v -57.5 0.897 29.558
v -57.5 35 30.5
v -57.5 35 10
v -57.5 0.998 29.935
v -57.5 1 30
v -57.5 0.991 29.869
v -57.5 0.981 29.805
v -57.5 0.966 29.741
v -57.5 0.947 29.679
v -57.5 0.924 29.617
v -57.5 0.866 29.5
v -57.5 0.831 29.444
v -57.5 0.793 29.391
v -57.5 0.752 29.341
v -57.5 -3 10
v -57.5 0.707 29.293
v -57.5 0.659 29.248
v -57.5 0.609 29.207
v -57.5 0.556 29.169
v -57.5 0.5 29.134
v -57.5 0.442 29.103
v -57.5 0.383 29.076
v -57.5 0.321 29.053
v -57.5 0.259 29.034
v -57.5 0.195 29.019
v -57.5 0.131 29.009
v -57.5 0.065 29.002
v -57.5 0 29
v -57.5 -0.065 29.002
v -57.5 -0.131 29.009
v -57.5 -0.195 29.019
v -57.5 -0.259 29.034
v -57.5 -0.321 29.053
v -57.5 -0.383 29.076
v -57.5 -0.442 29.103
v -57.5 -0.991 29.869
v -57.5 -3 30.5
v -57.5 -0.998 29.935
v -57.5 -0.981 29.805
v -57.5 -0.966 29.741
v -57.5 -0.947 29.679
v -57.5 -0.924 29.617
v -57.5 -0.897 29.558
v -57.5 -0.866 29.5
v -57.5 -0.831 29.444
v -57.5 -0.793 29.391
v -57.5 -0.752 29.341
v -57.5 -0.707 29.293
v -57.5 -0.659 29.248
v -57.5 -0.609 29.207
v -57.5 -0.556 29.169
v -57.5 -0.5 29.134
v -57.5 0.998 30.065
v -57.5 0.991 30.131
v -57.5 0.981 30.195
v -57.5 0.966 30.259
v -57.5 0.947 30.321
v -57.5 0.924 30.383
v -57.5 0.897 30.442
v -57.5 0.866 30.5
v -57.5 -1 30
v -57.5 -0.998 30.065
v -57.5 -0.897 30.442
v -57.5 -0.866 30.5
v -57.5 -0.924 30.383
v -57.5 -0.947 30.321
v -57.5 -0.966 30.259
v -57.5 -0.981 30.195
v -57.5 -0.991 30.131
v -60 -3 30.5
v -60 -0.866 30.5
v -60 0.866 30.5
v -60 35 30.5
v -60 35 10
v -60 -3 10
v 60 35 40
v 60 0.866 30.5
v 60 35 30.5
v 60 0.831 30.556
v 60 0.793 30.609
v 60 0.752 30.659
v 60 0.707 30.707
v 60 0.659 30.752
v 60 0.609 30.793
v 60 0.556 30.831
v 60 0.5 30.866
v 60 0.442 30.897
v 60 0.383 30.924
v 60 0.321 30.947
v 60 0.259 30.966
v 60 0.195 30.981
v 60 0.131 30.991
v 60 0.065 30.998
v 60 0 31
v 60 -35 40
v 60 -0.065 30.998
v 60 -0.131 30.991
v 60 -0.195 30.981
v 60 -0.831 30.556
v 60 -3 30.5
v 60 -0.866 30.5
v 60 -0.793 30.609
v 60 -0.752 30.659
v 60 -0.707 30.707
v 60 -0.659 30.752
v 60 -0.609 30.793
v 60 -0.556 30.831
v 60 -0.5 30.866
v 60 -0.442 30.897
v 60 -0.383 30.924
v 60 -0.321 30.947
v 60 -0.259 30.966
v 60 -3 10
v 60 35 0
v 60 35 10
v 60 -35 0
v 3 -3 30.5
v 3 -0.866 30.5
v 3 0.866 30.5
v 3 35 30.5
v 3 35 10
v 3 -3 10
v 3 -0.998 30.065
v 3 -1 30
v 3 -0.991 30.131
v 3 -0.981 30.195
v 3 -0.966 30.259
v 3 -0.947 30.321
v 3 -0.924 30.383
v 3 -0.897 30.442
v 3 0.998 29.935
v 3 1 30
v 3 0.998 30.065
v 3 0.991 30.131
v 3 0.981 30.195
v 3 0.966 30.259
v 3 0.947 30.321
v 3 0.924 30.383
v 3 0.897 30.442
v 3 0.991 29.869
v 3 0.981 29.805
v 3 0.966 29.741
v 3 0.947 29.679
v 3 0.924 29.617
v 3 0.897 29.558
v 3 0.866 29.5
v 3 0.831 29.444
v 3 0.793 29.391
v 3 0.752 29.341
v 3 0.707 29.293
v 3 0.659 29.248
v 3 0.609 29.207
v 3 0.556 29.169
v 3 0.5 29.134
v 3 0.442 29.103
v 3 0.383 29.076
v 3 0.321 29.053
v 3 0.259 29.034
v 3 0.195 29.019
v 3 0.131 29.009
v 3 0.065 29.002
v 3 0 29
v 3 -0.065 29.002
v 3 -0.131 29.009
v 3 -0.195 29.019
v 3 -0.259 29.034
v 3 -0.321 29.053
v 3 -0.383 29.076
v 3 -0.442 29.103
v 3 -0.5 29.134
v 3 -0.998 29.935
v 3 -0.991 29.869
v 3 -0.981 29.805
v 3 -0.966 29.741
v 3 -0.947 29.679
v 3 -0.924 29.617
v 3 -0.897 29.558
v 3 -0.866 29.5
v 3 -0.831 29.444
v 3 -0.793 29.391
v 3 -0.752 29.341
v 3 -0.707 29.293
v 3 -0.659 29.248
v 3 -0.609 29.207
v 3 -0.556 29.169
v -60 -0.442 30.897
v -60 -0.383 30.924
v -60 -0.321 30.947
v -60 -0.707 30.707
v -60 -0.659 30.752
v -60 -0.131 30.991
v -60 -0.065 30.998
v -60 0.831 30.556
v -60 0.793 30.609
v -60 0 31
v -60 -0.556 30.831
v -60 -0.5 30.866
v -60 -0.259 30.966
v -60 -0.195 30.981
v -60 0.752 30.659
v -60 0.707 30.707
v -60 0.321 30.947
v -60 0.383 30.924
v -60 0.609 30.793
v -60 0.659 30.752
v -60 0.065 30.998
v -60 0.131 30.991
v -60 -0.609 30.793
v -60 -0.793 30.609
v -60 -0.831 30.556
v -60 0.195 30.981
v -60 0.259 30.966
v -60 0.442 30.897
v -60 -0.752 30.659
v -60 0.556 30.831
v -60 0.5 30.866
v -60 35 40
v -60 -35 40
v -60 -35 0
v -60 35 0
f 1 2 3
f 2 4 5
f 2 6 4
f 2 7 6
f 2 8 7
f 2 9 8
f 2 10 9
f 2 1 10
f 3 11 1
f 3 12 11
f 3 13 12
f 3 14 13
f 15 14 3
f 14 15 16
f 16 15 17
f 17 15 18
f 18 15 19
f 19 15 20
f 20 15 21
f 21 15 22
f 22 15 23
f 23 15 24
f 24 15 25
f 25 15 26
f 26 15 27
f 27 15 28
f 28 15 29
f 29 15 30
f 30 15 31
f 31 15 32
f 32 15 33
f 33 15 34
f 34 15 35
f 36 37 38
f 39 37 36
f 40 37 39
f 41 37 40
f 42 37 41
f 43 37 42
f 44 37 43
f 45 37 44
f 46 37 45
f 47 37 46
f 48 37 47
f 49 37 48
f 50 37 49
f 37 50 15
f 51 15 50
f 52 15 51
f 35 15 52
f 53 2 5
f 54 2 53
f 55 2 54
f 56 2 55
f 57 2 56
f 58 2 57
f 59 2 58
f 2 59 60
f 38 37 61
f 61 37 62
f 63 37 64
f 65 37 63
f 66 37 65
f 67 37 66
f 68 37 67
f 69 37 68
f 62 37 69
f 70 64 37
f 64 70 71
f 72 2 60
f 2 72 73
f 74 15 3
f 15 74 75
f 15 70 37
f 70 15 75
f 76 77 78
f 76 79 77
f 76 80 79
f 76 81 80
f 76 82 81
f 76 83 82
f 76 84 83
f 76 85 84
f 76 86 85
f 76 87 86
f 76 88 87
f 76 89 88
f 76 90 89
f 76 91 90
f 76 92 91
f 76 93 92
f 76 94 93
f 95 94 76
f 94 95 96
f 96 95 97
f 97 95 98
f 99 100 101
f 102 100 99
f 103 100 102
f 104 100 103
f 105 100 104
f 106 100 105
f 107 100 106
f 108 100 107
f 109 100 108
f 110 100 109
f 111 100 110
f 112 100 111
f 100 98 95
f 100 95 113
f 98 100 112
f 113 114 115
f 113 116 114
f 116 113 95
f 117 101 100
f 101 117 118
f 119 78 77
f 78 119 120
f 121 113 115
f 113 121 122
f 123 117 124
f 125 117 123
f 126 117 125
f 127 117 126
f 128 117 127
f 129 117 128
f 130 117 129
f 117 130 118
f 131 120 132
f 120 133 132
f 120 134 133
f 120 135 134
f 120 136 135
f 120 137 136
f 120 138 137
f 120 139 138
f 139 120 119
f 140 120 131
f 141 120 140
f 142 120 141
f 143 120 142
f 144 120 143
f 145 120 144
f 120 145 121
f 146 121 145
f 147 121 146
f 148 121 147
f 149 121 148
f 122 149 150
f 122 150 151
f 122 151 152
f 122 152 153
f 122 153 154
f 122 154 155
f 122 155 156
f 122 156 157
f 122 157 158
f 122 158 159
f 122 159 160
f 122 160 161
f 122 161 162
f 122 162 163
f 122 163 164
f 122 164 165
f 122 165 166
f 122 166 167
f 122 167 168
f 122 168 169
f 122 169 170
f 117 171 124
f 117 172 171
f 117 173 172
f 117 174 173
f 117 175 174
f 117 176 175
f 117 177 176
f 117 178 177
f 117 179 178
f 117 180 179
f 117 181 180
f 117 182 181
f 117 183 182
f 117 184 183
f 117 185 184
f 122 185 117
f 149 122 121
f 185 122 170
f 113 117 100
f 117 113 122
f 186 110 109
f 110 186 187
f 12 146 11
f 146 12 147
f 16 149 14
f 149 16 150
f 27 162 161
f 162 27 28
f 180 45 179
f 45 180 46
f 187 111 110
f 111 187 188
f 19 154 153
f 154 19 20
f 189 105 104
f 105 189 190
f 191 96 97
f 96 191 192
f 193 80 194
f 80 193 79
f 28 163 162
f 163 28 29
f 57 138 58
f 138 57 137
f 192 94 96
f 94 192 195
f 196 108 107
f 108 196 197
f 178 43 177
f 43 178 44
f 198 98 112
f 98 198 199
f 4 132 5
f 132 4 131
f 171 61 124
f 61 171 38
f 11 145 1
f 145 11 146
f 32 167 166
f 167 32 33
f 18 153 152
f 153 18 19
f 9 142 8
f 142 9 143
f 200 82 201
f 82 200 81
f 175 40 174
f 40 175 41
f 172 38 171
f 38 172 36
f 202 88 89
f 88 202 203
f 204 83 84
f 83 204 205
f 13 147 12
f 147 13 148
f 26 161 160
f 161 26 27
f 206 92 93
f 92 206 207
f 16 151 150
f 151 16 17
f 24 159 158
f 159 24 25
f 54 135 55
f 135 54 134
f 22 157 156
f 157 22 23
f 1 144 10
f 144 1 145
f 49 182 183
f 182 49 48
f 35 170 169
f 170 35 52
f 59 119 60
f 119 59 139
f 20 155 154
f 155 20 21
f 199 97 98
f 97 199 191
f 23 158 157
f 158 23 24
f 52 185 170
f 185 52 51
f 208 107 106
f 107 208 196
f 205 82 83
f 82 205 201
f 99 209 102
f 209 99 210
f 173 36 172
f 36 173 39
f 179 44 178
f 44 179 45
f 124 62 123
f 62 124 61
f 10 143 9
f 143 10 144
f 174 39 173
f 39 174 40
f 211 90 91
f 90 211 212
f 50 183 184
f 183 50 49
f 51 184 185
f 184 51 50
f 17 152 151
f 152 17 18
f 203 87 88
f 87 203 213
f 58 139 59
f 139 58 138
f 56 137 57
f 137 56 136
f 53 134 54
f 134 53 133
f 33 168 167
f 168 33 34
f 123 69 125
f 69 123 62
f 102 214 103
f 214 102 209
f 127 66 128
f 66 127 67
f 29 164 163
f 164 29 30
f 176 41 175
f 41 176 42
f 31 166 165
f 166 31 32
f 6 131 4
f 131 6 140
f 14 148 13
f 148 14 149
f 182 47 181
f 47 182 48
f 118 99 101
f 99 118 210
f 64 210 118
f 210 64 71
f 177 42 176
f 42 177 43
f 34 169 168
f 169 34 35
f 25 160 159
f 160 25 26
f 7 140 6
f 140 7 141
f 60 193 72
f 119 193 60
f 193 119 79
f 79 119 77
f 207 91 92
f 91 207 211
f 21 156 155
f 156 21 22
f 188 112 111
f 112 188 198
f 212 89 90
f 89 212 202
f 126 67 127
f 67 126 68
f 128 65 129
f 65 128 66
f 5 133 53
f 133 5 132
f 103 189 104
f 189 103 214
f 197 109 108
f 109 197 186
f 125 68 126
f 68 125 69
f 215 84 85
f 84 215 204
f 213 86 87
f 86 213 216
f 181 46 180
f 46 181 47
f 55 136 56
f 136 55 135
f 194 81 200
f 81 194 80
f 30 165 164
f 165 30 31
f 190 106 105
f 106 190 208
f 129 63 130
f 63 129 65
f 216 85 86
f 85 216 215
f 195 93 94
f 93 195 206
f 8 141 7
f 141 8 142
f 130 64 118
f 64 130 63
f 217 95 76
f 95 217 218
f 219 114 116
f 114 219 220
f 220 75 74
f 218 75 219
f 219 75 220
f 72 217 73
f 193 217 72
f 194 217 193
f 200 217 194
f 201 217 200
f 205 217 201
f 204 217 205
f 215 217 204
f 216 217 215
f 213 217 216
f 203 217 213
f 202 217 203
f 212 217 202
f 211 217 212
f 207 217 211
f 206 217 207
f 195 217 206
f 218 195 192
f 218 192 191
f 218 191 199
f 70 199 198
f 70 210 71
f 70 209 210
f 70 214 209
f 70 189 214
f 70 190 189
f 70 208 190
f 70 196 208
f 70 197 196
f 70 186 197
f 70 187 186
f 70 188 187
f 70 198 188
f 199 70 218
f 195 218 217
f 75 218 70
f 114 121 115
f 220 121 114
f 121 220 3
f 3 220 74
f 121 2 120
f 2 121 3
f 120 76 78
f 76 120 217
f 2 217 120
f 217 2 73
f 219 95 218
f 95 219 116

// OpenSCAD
// Mini horizontal gel-electrophoresis box - buffer tank
// Print orientation: tank rests on XY plane at z = 0, builds upward (+Z)

// ---------------- Parameters ----------------
tank_x      = 120;   // outer length along X (mm)
tank_y      = 70;    // outer width along Y (mm)
tank_h      = 40;    // outer height along Z (mm)
wall        = 3;     // wall thickness (mm)
floor       = 3;     // floor thickness (mm)

platform_x  = 60;    // platform length along X (mm), centred
platform_y  = tank_y - 2 * wall;  // platform spans full inner width (mm)
platform_top = 10;   // platform top height above inner floor (mm) -> z = floor + platform_top

hole_d      = 2;     // electrode hole diameter (mm)
hole_y      = 0;     // electrode hole Y position (mm)
hole_z      = 30;    // electrode hole Z position (mm)

eps         = 0.5;   // cutter overshoot past faces (mm)
$fn         = 96;    // curve resolution

// Derived
inner_floor_z = floor;
platform_z0   = inner_floor_z + platform_top - wall;  // platform bottom (above floor)
chamber_h     = hole_z - platform_z0;                 // chamber height where water connects

// ---------------- Model ----------------
difference() {
    // Tank body: open top, solid floor and walls
    translate([-tank_x/2, -tank_y/2, 0])
        cube([tank_x, tank_y, tank_h]);

    // Cut out the two buffer chambers above the central platform
    for (sx = [-1, 1])
        translate([sx > 0 ? wall : -tank_x/2 - eps, -wall, platform_z0])
            cube([sx > 0 ? tank_x/2 - wall : wall, tank_y + 2*wall, chamber_h + eps]);

    // Horizontal electrode holes through each end wall, along X
    for (sx = [-1, 1])
        translate([sx * (tank_x/2 - wall/2), hole_y, hole_z])
            rotate([0, 90, 0])
                cylinder(d = hole_d, h = tank_x + 2*eps, center = true);
}
